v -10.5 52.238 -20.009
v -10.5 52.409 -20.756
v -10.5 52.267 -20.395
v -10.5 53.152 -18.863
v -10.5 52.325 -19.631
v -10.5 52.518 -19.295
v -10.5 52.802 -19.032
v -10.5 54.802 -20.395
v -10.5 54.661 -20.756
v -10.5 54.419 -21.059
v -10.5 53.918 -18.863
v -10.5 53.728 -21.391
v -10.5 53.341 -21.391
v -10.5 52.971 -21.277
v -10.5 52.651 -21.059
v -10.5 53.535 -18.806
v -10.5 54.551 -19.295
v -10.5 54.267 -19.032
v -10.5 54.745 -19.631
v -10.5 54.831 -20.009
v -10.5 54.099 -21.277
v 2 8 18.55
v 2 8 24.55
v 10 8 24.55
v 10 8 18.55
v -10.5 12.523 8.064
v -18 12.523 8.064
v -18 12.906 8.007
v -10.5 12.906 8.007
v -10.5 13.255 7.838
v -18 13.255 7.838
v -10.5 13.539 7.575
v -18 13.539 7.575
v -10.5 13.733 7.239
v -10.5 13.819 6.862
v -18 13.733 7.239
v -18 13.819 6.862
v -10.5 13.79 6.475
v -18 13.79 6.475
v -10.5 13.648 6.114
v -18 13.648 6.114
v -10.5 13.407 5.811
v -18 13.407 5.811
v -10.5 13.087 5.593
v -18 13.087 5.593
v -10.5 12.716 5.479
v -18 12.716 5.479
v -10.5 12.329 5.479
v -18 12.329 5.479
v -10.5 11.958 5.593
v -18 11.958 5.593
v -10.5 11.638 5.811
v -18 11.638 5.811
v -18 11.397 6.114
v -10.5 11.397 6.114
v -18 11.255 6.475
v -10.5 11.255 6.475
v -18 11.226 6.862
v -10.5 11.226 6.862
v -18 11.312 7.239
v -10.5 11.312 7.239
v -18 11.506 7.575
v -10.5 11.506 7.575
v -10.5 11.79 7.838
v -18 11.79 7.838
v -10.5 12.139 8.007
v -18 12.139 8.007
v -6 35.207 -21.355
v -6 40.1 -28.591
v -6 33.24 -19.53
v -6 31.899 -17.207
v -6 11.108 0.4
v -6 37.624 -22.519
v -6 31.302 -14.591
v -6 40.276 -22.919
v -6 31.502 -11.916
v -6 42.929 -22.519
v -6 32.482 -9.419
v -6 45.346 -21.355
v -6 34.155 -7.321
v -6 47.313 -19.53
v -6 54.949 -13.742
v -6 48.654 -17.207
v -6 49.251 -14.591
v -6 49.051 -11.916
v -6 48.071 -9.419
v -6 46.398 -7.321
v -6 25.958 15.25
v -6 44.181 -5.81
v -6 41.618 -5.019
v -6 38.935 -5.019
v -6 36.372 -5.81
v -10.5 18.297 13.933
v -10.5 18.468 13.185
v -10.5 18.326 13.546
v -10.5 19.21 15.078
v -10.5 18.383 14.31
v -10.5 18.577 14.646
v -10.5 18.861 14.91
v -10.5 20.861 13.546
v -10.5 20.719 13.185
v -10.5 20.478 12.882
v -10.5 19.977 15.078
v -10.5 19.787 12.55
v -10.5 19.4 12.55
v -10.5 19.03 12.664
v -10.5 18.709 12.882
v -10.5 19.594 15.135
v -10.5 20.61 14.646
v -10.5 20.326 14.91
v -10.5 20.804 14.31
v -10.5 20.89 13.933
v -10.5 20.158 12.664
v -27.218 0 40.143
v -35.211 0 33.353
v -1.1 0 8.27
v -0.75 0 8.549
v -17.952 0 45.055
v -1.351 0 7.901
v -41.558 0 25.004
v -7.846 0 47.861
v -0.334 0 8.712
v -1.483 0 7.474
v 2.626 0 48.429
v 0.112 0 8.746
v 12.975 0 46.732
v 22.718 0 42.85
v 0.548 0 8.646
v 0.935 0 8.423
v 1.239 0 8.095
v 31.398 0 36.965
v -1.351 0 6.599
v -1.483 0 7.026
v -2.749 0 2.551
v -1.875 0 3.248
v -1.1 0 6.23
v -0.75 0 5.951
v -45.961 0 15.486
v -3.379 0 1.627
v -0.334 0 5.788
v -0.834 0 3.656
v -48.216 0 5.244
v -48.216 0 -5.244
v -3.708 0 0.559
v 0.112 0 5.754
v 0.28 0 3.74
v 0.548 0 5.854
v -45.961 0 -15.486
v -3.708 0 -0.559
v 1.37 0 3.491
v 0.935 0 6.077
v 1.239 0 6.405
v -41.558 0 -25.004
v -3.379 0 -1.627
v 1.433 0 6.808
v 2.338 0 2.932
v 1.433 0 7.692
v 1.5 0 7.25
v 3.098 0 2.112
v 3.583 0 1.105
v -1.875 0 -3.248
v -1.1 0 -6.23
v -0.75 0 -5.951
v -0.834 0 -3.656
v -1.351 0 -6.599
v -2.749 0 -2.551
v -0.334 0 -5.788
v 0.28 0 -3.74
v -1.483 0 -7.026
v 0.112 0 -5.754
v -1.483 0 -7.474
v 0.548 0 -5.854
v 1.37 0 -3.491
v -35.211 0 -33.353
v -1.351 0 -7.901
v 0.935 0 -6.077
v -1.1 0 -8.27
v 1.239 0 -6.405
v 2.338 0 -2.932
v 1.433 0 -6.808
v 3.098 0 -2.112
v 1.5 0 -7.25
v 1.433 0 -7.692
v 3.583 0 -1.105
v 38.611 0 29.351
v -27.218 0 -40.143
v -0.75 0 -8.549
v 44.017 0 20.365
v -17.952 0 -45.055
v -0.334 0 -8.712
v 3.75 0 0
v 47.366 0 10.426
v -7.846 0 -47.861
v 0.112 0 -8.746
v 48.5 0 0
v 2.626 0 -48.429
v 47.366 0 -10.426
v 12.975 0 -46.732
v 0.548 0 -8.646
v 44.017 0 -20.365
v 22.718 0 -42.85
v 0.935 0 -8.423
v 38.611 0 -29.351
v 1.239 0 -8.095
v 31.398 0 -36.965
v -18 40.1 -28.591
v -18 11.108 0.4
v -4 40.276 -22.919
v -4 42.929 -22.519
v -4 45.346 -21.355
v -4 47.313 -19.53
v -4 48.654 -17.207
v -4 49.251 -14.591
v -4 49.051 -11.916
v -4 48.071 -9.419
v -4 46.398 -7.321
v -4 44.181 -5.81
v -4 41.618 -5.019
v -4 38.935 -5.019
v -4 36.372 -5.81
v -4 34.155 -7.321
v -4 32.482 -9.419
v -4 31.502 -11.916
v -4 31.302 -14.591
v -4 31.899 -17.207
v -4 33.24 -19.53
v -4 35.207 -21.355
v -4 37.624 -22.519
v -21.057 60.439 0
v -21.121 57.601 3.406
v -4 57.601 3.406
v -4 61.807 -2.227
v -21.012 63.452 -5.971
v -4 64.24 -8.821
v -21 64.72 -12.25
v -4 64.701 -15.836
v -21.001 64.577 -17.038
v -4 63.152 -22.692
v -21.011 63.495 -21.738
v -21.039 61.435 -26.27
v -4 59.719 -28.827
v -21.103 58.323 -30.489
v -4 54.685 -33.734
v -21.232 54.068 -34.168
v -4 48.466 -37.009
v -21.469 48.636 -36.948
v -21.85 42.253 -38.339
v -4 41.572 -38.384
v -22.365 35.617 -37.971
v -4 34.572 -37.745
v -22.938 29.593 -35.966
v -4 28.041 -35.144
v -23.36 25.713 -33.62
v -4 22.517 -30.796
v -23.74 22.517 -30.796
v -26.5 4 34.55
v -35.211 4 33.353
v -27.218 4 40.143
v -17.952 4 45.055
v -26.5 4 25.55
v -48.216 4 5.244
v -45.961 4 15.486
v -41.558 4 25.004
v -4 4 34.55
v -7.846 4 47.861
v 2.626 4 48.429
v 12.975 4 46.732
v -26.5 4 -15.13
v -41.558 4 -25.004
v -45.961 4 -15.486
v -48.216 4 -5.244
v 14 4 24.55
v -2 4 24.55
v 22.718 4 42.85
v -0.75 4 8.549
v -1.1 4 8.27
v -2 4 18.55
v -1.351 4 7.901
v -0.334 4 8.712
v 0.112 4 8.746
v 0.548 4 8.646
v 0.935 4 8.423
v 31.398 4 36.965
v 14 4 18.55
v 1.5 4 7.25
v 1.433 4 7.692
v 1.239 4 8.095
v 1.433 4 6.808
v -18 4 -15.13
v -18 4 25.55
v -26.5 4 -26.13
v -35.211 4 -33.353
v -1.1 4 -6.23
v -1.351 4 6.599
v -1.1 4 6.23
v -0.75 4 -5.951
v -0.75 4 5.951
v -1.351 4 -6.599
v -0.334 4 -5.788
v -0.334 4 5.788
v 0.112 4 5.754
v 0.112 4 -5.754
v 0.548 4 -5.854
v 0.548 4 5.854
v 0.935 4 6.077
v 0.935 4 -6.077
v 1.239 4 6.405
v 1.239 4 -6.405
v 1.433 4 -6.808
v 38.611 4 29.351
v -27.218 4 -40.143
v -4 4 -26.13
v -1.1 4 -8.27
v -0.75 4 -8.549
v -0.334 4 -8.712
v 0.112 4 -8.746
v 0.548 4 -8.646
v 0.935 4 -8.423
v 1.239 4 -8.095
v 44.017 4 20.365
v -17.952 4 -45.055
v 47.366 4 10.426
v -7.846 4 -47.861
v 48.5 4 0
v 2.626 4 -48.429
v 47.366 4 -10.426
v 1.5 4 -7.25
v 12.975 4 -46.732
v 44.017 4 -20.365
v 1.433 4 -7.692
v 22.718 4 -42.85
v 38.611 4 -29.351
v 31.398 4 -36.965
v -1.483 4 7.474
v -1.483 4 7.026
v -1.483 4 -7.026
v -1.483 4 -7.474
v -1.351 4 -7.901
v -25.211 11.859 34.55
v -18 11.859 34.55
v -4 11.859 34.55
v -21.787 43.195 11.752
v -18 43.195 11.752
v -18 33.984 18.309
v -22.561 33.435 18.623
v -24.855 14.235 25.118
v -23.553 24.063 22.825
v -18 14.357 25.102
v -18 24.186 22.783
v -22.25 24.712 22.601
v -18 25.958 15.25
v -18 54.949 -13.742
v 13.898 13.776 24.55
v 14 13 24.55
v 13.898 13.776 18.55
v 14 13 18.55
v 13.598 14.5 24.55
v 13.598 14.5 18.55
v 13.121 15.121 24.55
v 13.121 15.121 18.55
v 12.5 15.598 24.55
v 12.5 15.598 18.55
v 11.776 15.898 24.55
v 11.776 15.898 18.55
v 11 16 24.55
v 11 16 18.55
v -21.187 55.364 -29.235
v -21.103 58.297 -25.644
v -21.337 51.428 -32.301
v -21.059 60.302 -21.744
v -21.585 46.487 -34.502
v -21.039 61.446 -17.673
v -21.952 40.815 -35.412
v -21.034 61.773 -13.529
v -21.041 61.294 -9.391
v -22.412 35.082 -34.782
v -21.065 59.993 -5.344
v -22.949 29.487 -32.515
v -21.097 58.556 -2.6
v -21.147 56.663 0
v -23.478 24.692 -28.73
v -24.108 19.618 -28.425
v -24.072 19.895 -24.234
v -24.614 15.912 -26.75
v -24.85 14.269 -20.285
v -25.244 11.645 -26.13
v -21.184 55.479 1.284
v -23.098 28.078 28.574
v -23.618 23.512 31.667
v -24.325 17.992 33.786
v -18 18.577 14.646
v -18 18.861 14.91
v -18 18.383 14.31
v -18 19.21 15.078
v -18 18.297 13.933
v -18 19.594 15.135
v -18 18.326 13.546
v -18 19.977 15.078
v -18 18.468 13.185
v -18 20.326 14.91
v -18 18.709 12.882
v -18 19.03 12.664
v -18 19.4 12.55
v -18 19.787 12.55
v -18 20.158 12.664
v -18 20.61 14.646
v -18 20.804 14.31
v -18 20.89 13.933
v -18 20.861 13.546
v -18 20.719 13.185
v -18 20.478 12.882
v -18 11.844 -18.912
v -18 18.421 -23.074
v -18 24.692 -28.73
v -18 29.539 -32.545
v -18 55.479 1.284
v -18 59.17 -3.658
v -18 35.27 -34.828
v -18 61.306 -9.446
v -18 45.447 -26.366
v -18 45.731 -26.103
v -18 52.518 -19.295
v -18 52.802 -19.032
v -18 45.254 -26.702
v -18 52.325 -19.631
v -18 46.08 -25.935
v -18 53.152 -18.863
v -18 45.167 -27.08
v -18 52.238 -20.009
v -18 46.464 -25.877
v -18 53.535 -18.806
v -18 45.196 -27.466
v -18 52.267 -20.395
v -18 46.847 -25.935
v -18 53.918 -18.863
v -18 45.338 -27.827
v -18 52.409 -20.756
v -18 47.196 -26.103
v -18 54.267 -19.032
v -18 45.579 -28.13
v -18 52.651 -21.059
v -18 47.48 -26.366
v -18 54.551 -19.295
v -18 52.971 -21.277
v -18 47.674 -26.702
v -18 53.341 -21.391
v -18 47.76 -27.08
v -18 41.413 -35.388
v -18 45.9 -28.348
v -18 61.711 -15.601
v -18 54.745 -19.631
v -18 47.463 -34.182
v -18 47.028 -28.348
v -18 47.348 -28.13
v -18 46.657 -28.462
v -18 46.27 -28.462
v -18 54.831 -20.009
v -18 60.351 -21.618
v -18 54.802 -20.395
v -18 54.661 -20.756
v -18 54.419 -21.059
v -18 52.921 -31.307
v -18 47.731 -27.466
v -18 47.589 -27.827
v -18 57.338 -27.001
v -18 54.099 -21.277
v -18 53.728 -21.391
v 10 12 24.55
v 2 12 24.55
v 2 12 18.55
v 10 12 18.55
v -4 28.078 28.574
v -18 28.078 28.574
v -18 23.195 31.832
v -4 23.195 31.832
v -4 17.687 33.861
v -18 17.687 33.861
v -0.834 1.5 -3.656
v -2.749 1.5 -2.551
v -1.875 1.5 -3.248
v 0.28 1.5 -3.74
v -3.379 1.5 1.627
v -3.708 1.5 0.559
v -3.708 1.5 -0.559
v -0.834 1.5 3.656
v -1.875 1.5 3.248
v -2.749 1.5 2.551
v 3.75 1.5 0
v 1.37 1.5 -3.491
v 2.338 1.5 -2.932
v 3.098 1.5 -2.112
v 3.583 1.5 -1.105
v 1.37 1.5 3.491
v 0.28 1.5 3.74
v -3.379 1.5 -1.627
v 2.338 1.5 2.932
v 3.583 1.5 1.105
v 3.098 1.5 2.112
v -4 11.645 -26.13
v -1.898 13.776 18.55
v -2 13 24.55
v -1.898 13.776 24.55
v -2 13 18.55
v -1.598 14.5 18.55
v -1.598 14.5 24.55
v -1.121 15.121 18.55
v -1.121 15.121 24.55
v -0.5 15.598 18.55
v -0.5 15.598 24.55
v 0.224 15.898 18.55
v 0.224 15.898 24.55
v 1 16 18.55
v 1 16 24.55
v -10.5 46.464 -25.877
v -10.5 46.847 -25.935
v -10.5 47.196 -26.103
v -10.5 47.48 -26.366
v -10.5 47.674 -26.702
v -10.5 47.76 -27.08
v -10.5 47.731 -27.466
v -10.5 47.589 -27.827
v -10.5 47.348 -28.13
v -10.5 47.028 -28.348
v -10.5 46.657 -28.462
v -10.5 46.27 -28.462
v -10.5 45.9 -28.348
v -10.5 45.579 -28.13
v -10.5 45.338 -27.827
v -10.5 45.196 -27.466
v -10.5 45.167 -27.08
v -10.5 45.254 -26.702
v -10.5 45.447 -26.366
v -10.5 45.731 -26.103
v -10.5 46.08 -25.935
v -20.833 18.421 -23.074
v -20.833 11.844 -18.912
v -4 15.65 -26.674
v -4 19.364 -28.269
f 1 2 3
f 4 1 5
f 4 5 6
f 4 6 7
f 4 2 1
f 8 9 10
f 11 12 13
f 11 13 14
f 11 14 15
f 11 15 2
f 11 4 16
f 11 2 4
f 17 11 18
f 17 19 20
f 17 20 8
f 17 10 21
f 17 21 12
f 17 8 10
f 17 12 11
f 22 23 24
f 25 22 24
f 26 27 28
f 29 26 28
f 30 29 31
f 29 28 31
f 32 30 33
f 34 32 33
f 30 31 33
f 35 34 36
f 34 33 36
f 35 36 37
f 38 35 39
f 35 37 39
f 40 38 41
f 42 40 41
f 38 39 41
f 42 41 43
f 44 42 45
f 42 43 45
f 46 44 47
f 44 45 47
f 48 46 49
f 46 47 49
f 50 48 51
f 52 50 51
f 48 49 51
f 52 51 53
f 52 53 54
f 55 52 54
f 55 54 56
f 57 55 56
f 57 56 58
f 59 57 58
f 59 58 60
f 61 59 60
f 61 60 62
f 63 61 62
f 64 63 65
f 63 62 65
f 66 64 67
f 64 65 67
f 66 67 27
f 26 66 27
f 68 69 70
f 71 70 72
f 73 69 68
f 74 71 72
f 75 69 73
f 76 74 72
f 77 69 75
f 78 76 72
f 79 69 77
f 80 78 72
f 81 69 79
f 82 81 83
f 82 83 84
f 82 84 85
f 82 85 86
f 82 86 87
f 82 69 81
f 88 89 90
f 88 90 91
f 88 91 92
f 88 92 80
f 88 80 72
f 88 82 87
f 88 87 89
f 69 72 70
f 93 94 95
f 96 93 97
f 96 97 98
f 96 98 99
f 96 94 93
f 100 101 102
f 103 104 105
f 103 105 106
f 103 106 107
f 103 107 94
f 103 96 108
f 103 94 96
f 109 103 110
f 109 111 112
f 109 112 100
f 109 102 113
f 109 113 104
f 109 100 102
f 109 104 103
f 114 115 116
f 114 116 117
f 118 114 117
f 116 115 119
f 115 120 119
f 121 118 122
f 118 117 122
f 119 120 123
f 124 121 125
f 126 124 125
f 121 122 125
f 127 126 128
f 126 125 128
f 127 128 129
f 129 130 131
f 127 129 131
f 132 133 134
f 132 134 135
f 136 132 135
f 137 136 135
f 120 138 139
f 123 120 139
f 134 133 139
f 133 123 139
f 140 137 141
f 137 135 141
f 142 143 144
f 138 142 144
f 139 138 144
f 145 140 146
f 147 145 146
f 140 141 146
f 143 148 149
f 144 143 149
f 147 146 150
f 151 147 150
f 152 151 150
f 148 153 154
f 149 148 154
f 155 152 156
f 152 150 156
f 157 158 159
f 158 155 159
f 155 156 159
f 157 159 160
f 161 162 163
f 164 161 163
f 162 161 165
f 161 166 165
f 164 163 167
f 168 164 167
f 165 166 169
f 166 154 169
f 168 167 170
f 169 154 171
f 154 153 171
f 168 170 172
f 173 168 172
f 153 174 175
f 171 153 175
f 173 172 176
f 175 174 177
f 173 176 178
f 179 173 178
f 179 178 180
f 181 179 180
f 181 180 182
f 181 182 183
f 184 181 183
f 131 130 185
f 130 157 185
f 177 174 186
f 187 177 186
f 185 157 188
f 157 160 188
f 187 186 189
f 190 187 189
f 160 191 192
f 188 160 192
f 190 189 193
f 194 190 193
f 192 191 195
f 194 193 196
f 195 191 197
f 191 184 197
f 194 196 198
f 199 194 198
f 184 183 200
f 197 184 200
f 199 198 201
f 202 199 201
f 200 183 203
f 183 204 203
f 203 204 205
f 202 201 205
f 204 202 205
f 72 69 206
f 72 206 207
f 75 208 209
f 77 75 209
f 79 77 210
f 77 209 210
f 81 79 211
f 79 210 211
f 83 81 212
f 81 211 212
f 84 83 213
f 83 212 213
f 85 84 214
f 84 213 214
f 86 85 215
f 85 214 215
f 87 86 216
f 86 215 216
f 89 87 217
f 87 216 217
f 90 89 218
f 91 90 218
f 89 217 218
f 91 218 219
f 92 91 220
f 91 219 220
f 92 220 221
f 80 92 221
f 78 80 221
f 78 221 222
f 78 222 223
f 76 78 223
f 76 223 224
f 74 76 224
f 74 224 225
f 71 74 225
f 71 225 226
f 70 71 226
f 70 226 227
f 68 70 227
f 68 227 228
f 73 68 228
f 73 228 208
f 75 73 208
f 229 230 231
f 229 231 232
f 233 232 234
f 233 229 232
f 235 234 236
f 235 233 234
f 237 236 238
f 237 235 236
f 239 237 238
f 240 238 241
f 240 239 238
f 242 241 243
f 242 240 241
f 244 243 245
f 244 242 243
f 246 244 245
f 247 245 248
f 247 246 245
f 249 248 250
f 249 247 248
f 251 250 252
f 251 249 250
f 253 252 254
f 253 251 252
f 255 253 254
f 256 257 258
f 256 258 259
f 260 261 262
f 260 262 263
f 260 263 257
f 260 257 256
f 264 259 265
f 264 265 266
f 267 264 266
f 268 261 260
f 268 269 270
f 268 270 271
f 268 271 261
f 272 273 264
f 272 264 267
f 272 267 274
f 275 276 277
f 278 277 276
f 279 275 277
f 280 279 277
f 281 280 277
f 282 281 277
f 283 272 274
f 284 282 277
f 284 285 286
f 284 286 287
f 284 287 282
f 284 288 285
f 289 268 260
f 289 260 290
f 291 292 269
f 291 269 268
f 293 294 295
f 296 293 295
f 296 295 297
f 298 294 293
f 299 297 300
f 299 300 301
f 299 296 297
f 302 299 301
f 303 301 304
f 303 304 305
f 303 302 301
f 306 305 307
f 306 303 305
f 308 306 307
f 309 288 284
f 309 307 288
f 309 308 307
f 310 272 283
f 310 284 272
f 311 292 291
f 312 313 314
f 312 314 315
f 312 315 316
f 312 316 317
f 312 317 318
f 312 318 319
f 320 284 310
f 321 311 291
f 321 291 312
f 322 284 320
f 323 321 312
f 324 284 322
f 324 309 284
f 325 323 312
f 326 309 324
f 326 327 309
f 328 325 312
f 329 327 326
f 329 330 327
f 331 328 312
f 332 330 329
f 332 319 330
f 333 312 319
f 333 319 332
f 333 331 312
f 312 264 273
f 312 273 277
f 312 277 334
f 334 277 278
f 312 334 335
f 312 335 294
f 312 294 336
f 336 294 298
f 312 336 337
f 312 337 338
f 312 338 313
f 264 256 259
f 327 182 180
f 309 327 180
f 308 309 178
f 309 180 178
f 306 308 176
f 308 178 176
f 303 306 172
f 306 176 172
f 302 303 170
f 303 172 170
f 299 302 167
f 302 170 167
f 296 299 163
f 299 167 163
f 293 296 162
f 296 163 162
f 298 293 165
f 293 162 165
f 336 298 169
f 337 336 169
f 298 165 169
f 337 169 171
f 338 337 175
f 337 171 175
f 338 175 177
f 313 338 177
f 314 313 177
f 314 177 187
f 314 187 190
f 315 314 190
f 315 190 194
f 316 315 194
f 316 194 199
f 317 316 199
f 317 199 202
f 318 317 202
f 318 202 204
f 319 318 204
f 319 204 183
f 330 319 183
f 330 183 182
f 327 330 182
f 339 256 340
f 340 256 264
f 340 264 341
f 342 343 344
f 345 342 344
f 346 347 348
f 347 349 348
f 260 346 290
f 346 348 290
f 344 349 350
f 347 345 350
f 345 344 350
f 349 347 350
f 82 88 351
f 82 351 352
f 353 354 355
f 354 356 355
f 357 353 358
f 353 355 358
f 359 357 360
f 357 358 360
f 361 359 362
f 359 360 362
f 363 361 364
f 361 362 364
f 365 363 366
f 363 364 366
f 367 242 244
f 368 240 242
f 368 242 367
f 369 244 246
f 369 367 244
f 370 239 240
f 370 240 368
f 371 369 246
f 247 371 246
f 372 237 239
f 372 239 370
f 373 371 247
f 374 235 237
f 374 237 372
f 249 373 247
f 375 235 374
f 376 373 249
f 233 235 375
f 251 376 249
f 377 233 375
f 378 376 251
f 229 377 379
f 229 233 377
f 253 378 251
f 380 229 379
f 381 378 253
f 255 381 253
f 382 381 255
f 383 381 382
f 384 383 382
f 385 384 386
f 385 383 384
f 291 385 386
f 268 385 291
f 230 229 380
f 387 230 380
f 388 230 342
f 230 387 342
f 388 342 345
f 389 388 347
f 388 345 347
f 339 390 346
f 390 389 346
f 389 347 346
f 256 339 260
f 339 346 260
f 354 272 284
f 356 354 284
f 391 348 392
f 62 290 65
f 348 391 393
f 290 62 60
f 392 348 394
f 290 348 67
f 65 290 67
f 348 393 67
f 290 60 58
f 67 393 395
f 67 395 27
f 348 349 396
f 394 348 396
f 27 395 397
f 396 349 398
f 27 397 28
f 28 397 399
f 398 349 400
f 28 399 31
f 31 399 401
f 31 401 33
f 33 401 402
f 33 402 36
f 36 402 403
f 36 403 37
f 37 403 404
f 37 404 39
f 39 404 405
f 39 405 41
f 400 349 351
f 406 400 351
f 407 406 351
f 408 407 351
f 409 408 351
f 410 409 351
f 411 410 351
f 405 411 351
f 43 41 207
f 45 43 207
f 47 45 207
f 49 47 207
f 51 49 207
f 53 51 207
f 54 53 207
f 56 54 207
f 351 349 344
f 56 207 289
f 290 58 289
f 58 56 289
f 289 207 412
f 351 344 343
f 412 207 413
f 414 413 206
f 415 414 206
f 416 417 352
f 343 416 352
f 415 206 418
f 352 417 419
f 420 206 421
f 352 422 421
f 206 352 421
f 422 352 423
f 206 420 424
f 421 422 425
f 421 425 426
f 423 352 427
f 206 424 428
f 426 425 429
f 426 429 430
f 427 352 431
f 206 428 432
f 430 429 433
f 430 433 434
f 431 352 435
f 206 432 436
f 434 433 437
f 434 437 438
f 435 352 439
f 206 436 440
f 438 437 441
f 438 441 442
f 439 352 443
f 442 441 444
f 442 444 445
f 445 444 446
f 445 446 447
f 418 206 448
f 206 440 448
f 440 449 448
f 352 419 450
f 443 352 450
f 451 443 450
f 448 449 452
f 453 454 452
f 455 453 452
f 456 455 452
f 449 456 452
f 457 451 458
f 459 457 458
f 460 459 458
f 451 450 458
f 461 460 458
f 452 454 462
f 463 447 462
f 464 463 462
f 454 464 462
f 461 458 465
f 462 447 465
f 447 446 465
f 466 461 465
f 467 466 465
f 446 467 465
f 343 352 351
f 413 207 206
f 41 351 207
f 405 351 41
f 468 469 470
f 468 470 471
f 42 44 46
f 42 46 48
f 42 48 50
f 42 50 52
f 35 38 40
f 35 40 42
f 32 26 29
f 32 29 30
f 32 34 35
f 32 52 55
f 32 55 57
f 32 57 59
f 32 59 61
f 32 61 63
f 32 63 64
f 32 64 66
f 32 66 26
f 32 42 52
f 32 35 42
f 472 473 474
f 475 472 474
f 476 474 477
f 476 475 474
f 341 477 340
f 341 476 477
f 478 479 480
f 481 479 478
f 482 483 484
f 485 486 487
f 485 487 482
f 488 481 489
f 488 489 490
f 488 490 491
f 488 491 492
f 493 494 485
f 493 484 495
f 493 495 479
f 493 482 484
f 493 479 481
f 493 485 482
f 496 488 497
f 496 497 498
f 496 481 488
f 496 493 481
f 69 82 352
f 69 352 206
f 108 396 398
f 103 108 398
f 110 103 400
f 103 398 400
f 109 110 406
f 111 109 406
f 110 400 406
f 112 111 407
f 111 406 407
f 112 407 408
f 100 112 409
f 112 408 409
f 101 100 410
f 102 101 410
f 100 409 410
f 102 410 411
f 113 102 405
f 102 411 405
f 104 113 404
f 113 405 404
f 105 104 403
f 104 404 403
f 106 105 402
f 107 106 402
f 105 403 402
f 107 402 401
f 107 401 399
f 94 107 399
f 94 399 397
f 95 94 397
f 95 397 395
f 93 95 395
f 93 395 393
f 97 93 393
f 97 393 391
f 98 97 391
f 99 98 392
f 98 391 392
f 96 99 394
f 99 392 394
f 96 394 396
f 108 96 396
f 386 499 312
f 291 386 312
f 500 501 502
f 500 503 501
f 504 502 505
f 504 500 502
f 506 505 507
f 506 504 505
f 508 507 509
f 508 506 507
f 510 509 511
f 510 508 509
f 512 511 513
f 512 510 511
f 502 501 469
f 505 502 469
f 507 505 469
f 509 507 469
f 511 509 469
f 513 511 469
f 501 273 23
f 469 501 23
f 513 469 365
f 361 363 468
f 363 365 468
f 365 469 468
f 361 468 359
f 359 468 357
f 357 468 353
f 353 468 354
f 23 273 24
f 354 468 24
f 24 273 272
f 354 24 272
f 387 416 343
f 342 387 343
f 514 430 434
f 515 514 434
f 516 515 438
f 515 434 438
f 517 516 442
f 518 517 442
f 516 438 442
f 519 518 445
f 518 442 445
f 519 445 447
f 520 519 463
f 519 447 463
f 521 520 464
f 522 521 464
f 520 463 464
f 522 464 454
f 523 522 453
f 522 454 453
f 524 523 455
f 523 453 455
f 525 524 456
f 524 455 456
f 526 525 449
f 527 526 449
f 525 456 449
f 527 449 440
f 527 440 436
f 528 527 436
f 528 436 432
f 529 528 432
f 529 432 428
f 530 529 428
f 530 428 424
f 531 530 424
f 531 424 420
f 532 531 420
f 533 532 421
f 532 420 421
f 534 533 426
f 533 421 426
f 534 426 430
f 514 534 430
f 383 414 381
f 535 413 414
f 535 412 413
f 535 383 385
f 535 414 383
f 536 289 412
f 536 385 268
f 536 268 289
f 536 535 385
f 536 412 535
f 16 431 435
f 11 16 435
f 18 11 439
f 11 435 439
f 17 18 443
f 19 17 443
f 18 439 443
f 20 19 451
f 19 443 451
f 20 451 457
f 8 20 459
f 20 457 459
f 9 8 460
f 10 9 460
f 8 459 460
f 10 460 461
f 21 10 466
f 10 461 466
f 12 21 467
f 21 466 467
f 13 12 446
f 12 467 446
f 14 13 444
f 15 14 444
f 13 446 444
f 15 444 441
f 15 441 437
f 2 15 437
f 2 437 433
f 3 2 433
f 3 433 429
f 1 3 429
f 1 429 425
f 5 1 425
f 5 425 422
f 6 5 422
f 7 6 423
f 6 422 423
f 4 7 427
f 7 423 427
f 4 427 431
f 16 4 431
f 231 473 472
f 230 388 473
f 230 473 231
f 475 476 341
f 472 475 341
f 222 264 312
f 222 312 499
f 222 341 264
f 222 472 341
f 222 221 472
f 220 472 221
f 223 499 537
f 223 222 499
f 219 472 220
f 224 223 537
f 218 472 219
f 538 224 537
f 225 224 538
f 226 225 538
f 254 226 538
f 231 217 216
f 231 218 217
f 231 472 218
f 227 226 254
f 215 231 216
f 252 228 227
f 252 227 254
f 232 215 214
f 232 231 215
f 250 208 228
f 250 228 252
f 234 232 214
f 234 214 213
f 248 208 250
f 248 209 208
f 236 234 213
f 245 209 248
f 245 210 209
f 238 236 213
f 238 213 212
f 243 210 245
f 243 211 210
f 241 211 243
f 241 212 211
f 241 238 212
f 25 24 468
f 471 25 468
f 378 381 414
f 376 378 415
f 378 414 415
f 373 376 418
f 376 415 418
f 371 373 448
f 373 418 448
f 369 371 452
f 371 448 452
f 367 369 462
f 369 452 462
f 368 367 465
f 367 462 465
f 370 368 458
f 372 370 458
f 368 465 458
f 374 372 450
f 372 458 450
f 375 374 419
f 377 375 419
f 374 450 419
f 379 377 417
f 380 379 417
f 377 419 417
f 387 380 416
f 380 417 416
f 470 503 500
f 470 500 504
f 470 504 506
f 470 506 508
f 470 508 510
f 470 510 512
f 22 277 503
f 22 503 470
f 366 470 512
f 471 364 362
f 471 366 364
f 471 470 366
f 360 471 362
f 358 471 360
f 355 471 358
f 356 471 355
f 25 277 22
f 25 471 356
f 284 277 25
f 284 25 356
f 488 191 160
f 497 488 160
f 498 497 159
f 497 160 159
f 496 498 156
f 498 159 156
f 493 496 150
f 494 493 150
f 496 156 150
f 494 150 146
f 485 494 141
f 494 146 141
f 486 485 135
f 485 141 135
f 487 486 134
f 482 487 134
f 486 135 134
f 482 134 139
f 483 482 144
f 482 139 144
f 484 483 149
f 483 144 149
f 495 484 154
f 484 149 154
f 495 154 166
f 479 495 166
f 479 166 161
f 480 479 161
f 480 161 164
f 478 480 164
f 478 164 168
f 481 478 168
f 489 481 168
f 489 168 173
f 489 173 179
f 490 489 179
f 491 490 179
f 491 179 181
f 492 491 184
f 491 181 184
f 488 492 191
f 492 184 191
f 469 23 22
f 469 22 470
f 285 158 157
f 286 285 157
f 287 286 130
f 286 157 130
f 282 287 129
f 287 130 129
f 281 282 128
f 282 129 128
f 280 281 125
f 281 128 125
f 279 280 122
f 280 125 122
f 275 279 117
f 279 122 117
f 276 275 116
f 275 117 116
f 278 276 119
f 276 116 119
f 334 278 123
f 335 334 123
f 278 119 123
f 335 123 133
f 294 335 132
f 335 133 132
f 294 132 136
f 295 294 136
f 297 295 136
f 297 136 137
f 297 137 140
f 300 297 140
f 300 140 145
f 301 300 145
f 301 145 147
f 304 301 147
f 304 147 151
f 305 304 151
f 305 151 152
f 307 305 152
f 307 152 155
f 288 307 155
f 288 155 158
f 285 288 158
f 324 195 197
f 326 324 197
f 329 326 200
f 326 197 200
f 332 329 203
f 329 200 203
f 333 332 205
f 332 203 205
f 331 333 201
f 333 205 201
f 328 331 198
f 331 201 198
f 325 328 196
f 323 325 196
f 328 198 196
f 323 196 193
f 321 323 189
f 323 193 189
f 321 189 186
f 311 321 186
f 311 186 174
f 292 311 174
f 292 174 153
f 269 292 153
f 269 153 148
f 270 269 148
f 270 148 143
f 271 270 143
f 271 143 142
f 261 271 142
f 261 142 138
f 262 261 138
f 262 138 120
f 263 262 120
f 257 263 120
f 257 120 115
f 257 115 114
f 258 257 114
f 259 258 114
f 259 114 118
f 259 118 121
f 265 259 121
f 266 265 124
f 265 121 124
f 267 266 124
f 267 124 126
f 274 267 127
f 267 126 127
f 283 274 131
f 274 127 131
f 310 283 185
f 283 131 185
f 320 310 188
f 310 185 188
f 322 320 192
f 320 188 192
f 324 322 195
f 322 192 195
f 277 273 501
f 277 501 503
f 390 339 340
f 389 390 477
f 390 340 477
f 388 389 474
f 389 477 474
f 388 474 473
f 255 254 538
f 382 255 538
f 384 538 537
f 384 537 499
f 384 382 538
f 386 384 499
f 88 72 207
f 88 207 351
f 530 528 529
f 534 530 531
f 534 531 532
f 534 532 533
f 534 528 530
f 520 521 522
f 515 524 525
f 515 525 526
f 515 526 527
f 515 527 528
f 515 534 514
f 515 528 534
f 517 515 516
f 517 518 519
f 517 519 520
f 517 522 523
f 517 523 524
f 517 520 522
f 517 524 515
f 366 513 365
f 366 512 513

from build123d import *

# Parameters (mm, degrees)
SKETCH2_R                = 48.5
BOSS_EXTRUDE1_DEPTH      = 4
SKETCH4_R                = 1.5
CUT_EXTRUDE2_DEPTH       = 5
SKETCH5_R                = 3.75
CUT_EXTRUDE3_DEPTH       = 1.5
BOSS_EXTRUDE2_DEPTH      = 14
CUT_EXTRUDE5_REACH       = 44.5
SKETCH9_R                = 1.3
CUT_EXTRUDE6_DEPTH       = 7.5
CUT_EXTRUDE9_REACH       = 46.5
SKETCH11_R               = 9
BOSS_EXTRUDE7_DEPTH      = 9
BOSS_EXTRUDE7_DEPTH_BACK = 14
BOSS_EXTRUDE10_DEPTH     = 9
SKETCH27_W               = 16
SKETCH27_H               = 6
BOSS_EXTRUDE11_DEPTH     = 12
FILLET6_R                = 3
CUT_EXTRUDE16_REACH      = 75.05
SKETCH28_W               = 8
SKETCH28_H               = 4
CUT_EXTRUDE17_DEPTH      = 49.5
CUT_EXTRUDE17_DEPTH_BACK = 49.5


with BuildPart() as part:
    # Sketch2 → Boss-Extrude1 (new body)
    with BuildSketch(Plane(origin=(0, 0, 0), x_dir=(1, 0, 0), z_dir=(0, 1, 0))):
        Circle(SKETCH2_R)
    extrude(amount=BOSS_EXTRUDE1_DEPTH)

    # Sketch4 → Cut-Extrude2 (cut, through all)
    with BuildSketch(Plane.XZ):
        with Locations((0, 7.25)):
            Circle(SKETCH4_R)
        with Locations((0, -7.25)):
            Circle(SKETCH4_R)
    extrude(amount=-CUT_EXTRUDE2_DEPTH, mode=Mode.SUBTRACT)

    # Sketch5 → Cut-Extrude3 (cut)
    with BuildSketch(Plane.XZ):
        Circle(SKETCH5_R)
    extrude(amount=-CUT_EXTRUDE3_DEPTH, mode=Mode.SUBTRACT)

    # Sketch7 → Boss-Extrude2 (add)
    with BuildSketch(Plane(origin=(-4, 0, 0), x_dir=(0, 0, -1), z_dir=(1, 0, 0))):
        with BuildLine():
            Line((23.129947874, 4), (23.129947874, 11.644549616))
            ThreePointArc((23.129947874, 11.644549616), (24.589048403, 18.743749901), (28.729797284, 24.692011643))
            ThreePointArc((28.729797284, 24.692011643), (29.313383054, 55.284736897), (-1.284289494, 55.479275971))
            Line((-1.284289494, 55.479275971), (-27.227315747, 29.536249718))
            ThreePointArc((-27.227315747, 29.536249718), (-32.64663453, 21.425665997), (-34.549646217, 11.858580188))
            Line((-34.549646217, 11.858580188), (-34.549646217, 4))
            Line((-34.549646217, 4), (23.129947874, 4))
        make_face()
    extrude(amount=-BOSS_EXTRUDE2_DEPTH)

    # Sketch8 → Cut-Extrude5 (cut, up to next)
    with BuildSketch(Plane(origin=(-6, 0, 0), x_dir=(0, 0, -1), z_dir=(1, 0, 0)), mode=Mode.PRIVATE) as cut_extrude5_sk1:
        Polygon((-15.249648422, 25.957567857), (13.741729607, 54.948945886), (28.590972012, 40.099703481), (-0.400406017, 11.108325452), align=None)
    cut_extrude5_tool1 = extrude(cut_extrude5_sk1.sketch, amount=-CUT_EXTRUDE5_REACH, mode=Mode.PRIVATE) & part.part
    add(cut_extrude5_tool1.solids().sort_by_distance((-6, 33.028636, -6.670662))[0], mode=Mode.SUBTRACT)

    # Sketch9 → Cut-Extrude6 (cut)
    with BuildSketch(Plane.ZY.offset(18)):
        with Locations((-20.105690637, 53.534732323)):
            Circle(SKETCH9_R)
        with Locations((-27.176758449, 46.463664511)):
            Circle(SKETCH9_R)
        with Locations((6.764367048, 12.522539014)):
            Circle(SKETCH9_R)
        with Locations((13.83543486, 19.593606826)):
            Circle(SKETCH9_R)
    extrude(amount=-CUT_EXTRUDE6_DEPTH, mode=Mode.SUBTRACT)

    # Sketch11 → Cut-Extrude9 (cut, up to next)
    with BuildSketch(Plane(origin=(-4, 0, 0), x_dir=(0, 0, -1), z_dir=(1, 0, 0)), mode=Mode.PRIVATE) as cut_extrude9_sk1:
        with Locations((13.918506302, 40.276480176)):
            Circle(SKETCH11_R)
    cut_extrude9_tool1 = extrude(cut_extrude9_sk1.sketch, amount=-CUT_EXTRUDE9_REACH, mode=Mode.PRIVATE) & part.part
    add(cut_extrude9_tool1.solids().sort_by_distance((-4, 40.27648, -13.918506))[0], mode=Mode.SUBTRACT)

    # Sketch17 → Boss-Extrude7 (add, two sides)
    with BuildSketch(Plane.ZY.offset(18)) as boss_extrude7_sk:
        with BuildLine():
            ThreePointArc((34.549646217, 11.858580188), (33.008342843, 20.500891953), (28.574482006, 28.077569775))
            ThreePointArc((28.574482006, 28.077569775), (27.915386359, 28.820289685), (27.227315747, 29.536249718))
            Line((27.227315747, 29.536249718), (1.284289494, 55.479275971))
            Line((1.284289494, 55.479275971), (26.295003593, 26.127182305))
            ThreePointArc((26.295003593, 26.127182305), (30.194232218, 19.461281607), (31.549646217, 11.858580188))
            Line((31.549646217, 11.858580188), (31.549646217, 4))
            Line((31.549646217, 4), (34.549646217, 4))
            Line((34.549646217, 4), (34.549646217, 11.858580188))
        make_face()
        with BuildLine():
            Line((28.574482006, 28.077569775), (3.405609837, 57.600596315))
            ThreePointArc((3.405609837, 57.600596315), (-31.461505391, 57.378912253), (-30.796489049, 22.517434639))
            ThreePointArc((-30.796489049, 22.517434639), (-27.345864981, 17.560549854), (-26.129947874, 11.644549616))
            Line((-26.129947874, 11.644549616), (-26.129947874, 4))
            Line((-26.129947874, 4), (-23.129947874, 4))
            Line((-23.129947874, 4), (-23.129947874, 11.644549616))
            ThreePointArc((-23.129947874, 11.644549616), (-24.589048403, 18.743749901), (-28.729797284, 24.692011643))
            ThreePointArc((-28.729797284, 24.692011643), (-29.313383054, 55.284736897), (1.284289494, 55.479275971))
            Line((1.284289494, 55.479275971), (27.227315747, 29.536249718))
            ThreePointArc((27.227315747, 29.536249718), (27.915386359, 28.820289685), (28.574482006, 28.077569775))
        make_face()
    extrude(amount=BOSS_EXTRUDE7_DEPTH)
    extrude(boss_extrude7_sk.sketch, amount=-BOSS_EXTRUDE7_DEPTH_BACK)

    # Sketch25 → Boss-Extrude10 (add)
    with BuildSketch(Plane.ZY.offset(18)):
        with BuildLine():
            ThreePointArc((-28.729797284, 24.692011643), (-24.589048403, 18.743749901), (-23.129947874, 11.644549616))
            Line((-23.129947874, 11.644549616), (-23.129947874, 4))
            Line((-23.129947874, 4), (-15.129947874, 4))
            add(Edge.make_bspline(
                [(-28.729797284, 24.692011643), (-21.954867515, 18.253200081), (-19.09405247, 12.798017691), (-15.129947874, 4)],
                knots=[0, 0, 0, 0, 1, 1, 1, 1], degree=3))
        make_face()
        with BuildLine():
            add(Edge.make_bspline(
                [(11.751619577, 43.19501844), (26.551255916, 25.8264495), (25.549646217, 4)],
                knots=[0, 0, 0, 1, 1, 1], degree=2))
            Line((25.549646217, 4), (31.549646217, 4))
            Line((31.549646217, 4), (31.549646217, 11.858580188))
            ThreePointArc((31.549646217, 11.858580188), (30.194232218, 19.461281607), (26.295003593, 26.127182305))
            Line((26.295003593, 26.127182305), (11.751619577, 43.19501844))
        make_face()
    extrude(amount=BOSS_EXTRUDE10_DEPTH)

    # Sketch27 → Boss-Extrude11 (add)
    with BuildSketch(Plane(origin=(0, 4, 0), x_dir=(1, 0, 0), z_dir=(0, 1, 0))):
        with Locations((6, -21.549646217)):
            Rectangle(SKETCH27_W, SKETCH27_H)
    extrude(amount=BOSS_EXTRUDE11_DEPTH)

    # Fillet6
    fillet6_edges = [part.edges().sort_by_distance(p)[0] for p in [
        (-2, 16, 21.549646217),
        (14, 16, 21.549646217),
    ]]
    fillet(fillet6_edges, radius=FILLET6_R)

    # Sketch28 → Cut-Extrude16 (cut, up to next)
    with BuildSketch(Plane.XY.offset(24.549646217), mode=Mode.PRIVATE) as cut_extrude16_sk1:
        with Locations((6, 10)):
            Rectangle(SKETCH28_W, SKETCH28_H)
    cut_extrude16_tool1 = extrude(cut_extrude16_sk1.sketch, amount=-CUT_EXTRUDE16_REACH, mode=Mode.PRIVATE) & part.part
    add(cut_extrude16_tool1.solids().sort_by_distance((6, 10, 24.549646))[0], mode=Mode.SUBTRACT)

    # Sketch29 → Cut-Extrude17 (cut, two sides)
    with BuildSketch(Plane.XY) as cut_extrude17_sk:
        with BuildLine():
            Line((-21, 64.776480176), (-27, 64.776480176))
            Line((-27, 64.776480176), (-27, 4))
            Line((-27, 4), (-26.5, 4))
            add(Edge.make_bspline(
                [(-21, 64.776480176), (-21.220459696, 34.140901434), (-26.5, 4)],
                knots=[0, 0, 0, 1, 1, 1], degree=2))
        make_face()
    extrude(amount=CUT_EXTRUDE17_DEPTH, mode=Mode.SUBTRACT)
    extrude(cut_extrude17_sk.sketch, amount=-CUT_EXTRUDE17_DEPTH_BACK, mode=Mode.SUBTRACT)


solid = part.part
